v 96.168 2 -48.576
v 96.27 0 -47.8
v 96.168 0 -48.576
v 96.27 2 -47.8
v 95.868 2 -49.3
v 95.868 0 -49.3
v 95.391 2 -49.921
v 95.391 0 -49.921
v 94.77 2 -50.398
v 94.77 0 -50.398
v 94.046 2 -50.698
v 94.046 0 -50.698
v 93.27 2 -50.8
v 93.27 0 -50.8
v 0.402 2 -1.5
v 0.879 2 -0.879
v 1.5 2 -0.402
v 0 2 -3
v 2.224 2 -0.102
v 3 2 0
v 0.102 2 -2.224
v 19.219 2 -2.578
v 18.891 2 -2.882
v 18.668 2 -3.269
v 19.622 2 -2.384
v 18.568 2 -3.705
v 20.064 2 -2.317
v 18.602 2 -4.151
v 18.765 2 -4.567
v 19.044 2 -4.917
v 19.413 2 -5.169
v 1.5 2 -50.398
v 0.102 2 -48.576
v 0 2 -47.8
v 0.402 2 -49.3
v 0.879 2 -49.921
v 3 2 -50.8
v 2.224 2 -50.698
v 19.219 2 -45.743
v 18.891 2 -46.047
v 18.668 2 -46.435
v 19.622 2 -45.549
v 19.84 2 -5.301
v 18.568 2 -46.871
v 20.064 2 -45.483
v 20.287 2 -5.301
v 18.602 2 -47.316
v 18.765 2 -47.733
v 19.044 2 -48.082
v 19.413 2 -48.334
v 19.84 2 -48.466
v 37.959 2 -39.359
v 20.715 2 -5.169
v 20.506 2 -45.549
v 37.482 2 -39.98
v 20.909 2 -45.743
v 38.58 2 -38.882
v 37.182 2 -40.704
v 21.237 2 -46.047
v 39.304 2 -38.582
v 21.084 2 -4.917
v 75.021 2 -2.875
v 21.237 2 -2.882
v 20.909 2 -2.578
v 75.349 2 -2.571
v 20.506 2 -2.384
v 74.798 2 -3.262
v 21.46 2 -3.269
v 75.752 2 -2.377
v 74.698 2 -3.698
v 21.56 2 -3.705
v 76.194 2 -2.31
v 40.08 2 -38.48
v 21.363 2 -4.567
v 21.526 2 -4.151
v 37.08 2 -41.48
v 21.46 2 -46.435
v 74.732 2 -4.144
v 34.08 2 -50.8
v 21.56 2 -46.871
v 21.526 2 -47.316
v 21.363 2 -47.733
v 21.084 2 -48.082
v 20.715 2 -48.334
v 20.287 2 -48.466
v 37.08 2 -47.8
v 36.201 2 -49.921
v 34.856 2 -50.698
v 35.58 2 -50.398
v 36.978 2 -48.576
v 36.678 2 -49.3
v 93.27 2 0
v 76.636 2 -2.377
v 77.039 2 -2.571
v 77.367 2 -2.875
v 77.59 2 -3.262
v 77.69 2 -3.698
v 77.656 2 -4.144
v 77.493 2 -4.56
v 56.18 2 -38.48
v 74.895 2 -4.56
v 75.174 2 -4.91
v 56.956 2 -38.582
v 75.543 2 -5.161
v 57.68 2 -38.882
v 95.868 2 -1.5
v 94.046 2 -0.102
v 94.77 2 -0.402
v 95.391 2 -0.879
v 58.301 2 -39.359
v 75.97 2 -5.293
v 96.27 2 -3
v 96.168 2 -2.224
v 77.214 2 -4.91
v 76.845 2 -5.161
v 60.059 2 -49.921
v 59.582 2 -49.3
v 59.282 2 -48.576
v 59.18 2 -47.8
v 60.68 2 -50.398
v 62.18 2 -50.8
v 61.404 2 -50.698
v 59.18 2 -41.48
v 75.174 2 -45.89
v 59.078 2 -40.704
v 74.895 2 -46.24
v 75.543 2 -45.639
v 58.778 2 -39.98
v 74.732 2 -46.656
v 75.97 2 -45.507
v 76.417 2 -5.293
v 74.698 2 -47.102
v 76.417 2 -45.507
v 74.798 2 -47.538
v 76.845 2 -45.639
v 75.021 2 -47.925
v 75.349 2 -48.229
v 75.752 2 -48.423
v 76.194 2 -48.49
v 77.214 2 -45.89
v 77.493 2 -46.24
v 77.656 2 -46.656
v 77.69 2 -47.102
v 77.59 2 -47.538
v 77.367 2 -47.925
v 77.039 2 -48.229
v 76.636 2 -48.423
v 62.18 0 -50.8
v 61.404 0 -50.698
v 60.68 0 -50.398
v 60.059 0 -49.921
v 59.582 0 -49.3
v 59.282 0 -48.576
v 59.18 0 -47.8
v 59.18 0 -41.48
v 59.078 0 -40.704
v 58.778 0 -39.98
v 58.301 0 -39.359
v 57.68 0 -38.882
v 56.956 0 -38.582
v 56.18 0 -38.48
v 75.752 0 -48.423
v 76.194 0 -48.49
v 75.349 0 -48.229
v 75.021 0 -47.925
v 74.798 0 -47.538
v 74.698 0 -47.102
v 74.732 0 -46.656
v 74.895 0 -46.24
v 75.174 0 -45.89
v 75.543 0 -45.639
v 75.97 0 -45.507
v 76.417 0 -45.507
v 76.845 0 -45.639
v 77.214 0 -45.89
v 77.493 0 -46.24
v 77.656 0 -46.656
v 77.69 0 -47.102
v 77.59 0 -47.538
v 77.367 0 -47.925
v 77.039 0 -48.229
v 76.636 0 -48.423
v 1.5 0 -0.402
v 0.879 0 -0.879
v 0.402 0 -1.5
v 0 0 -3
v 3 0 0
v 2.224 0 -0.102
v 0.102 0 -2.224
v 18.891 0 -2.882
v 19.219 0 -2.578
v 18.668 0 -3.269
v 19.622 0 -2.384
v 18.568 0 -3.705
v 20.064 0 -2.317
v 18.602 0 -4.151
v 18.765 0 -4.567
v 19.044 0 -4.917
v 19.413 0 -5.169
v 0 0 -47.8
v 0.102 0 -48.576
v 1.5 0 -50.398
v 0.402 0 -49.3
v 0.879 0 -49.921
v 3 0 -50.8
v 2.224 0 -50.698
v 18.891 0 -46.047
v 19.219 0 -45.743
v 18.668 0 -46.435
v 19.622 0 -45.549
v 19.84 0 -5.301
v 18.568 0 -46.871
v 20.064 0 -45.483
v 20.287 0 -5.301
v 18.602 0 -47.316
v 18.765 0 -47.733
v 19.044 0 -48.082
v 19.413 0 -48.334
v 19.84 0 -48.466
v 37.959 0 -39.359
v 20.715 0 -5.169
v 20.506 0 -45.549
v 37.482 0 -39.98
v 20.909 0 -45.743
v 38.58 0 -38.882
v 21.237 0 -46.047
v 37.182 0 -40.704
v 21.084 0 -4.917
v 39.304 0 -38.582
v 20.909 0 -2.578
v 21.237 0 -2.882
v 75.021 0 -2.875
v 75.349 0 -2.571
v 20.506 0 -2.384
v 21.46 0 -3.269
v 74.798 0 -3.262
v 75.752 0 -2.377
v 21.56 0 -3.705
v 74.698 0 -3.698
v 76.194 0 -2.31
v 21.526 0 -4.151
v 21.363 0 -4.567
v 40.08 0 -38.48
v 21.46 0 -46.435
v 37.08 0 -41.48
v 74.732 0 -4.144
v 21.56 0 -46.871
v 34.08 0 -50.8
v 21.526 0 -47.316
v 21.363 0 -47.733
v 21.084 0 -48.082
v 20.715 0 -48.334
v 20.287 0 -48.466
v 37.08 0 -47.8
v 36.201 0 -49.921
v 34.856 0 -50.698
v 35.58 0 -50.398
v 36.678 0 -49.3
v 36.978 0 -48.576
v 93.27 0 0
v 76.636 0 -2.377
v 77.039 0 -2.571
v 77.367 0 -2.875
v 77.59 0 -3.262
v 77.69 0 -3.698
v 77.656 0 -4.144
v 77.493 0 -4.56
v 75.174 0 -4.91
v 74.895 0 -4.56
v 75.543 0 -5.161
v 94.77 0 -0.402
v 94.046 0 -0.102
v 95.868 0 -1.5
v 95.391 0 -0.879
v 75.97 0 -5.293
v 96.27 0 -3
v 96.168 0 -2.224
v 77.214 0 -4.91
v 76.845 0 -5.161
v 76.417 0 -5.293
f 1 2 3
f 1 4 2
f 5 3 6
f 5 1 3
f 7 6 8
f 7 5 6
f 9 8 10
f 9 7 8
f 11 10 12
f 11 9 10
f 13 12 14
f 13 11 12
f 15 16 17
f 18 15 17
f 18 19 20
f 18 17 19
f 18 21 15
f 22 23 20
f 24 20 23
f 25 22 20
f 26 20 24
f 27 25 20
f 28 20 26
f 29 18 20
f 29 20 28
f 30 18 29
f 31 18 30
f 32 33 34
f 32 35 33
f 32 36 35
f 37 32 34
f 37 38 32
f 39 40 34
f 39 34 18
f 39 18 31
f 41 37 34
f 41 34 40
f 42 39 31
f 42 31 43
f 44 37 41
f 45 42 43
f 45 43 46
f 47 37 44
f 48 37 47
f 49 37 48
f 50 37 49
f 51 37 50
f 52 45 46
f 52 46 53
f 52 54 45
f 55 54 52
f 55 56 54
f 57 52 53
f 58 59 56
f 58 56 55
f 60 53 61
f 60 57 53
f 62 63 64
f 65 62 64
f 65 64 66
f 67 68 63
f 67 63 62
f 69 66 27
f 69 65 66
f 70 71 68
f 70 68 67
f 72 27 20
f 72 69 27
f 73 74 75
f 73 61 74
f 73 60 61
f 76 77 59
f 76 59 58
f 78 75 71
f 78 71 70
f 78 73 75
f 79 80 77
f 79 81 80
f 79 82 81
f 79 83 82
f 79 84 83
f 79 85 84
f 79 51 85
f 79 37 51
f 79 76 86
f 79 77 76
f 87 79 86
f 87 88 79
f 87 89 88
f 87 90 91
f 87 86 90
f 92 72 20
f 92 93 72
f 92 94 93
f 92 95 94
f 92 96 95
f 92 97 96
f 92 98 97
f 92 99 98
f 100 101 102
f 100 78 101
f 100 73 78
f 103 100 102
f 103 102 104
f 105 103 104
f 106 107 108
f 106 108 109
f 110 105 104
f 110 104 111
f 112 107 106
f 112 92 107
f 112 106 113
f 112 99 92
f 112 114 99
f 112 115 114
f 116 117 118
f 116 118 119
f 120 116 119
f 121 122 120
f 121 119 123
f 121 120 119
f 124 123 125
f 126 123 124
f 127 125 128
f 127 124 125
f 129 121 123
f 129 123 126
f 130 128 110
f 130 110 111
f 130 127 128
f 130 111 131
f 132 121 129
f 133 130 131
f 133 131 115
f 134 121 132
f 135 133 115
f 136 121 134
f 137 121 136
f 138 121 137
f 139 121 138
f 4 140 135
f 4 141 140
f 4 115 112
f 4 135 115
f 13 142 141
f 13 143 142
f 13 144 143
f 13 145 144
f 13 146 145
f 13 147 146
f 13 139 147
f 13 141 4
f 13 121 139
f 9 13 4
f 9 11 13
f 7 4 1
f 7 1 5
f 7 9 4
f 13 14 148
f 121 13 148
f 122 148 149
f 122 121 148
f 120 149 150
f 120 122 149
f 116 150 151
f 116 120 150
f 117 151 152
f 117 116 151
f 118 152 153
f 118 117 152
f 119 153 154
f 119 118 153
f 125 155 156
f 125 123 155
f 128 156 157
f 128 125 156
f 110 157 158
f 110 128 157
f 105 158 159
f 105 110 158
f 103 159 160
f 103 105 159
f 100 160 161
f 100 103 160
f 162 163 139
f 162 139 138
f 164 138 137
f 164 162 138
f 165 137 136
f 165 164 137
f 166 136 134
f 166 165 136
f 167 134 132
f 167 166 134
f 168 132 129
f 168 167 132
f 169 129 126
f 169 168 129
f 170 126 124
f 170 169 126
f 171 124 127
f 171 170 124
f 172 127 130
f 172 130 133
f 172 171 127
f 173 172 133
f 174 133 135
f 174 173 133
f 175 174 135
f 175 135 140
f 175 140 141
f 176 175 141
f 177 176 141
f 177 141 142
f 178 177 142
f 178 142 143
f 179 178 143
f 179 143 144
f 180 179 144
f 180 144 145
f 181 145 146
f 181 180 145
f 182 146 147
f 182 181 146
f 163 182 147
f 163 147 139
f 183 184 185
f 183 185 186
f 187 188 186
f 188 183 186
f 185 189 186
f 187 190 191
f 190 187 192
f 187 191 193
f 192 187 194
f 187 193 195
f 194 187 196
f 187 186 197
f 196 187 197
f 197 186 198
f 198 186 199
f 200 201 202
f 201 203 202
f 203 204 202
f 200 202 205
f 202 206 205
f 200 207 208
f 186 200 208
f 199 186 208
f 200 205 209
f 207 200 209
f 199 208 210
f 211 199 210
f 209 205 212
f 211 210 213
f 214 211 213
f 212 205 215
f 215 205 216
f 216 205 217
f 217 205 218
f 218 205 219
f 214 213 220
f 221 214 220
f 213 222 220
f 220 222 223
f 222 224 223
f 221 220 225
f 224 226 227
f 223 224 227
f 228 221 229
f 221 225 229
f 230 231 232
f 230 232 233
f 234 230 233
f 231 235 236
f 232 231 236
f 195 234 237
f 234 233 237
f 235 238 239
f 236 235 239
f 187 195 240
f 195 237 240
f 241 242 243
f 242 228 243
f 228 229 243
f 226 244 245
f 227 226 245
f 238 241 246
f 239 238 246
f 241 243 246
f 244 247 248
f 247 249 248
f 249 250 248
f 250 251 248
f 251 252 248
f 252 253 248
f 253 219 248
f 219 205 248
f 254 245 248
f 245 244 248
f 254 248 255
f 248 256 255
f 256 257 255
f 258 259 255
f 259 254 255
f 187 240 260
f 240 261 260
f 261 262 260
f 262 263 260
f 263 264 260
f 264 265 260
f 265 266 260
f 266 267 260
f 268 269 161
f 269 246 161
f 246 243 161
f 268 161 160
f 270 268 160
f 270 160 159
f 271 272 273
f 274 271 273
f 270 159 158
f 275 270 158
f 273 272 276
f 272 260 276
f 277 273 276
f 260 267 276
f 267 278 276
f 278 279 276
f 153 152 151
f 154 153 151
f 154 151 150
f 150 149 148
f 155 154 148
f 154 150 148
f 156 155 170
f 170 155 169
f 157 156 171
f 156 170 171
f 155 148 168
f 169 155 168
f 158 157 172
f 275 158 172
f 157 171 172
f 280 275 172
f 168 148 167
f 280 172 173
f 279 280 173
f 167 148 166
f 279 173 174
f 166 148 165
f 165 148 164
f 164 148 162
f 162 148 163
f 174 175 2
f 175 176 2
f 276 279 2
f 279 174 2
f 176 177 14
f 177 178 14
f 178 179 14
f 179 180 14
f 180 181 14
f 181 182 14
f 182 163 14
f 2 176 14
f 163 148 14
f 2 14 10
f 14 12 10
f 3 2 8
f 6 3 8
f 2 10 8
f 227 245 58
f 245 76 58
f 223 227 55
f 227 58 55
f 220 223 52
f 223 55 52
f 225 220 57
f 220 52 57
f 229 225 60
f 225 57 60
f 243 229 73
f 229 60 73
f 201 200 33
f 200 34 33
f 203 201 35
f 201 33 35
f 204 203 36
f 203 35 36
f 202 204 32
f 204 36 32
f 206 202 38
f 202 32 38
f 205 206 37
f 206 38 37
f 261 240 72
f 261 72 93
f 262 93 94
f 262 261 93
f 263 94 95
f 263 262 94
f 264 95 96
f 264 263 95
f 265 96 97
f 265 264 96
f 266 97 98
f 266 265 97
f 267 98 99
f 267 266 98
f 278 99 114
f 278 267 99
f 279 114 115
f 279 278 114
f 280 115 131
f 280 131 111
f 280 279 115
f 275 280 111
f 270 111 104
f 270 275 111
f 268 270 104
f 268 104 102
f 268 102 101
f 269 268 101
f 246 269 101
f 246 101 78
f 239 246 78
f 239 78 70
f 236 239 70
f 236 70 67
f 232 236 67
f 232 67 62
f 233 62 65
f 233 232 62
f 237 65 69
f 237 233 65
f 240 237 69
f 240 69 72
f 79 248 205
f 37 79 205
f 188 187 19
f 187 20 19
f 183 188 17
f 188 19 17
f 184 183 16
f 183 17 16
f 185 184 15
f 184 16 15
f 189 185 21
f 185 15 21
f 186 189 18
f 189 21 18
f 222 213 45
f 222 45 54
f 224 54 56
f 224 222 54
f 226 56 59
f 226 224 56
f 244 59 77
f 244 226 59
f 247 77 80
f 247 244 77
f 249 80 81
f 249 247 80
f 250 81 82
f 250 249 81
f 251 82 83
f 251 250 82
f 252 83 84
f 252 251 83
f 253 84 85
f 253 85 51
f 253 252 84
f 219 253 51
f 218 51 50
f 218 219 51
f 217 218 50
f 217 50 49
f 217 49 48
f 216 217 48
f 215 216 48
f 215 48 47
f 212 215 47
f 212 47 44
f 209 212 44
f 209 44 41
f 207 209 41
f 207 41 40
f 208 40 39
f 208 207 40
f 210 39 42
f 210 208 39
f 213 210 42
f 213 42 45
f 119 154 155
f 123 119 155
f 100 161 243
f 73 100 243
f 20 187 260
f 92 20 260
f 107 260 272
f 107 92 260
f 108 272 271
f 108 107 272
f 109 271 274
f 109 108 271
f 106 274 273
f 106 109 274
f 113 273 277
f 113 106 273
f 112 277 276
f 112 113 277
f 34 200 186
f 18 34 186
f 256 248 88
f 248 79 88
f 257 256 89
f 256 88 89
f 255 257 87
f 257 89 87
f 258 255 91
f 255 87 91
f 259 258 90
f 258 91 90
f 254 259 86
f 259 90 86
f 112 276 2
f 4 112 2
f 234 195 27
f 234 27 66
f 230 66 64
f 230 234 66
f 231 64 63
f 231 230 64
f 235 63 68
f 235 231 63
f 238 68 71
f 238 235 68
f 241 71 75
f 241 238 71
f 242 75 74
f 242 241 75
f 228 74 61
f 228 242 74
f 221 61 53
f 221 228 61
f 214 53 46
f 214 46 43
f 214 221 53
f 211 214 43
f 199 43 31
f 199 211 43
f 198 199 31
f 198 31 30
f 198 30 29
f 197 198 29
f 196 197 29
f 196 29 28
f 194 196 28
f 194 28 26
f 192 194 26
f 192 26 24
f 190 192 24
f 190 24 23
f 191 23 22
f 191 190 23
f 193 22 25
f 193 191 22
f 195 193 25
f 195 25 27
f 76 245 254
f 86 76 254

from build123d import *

# Parameters (mm, degrees)
SKETCH_1_R      = 1.5
EXTRUDE_1_DEPTH = 2
FILLET_1_R      = 3


with BuildPart() as part:
    # 草图1 → 凸台-拉伸1 (new body)
    with BuildSketch(Plane(origin=(0, 0, 0), x_dir=(1, 0, 0), z_dir=(0, 1, 0))):
        Polygon((0, 0), (96.27, 0), (96.27, 50.8), (59.18, 50.8), (59.18, 38.48), (37.08, 38.48), (37.08, 50.8), (0, 50.8), align=None)
        with Locations(Location((20.063894942, 46.982706601, 0), (0, 0, 270))):
            Circle(SKETCH_1_R, mode=Mode.SUBTRACT)
        with Locations(Location((76.193894468, 46.99, 0), (0, 0, 90))):
            Circle(SKETCH_1_R, mode=Mode.SUBTRACT)
        with Locations(Location((76.193894468, 3.81, 0), (0, 0, 270))):
            Circle(SKETCH_1_R, mode=Mode.SUBTRACT)
        with Locations(Location((20.063894942, 3.817293399, 0), (0, 0, 270))):
            Circle(SKETCH_1_R, mode=Mode.SUBTRACT)
    extrude(amount=EXTRUDE_1_DEPTH)

    # 圆角1
    fillet_1_edges = [part.edges().sort_by_distance(p)[0] for p in [
        (37.08, 1, -50.8),
        (37.08, 1, -38.48),
        (59.18, 1, -38.48),
        (59.18, 1, -50.8),
        (96.27, 1, -50.8),
        (96.27, 1, 0),
        (0, 1, 0),
        (0, 1, -50.8),
    ]]
    fillet(fillet_1_edges, radius=FILLET_1_R)


solid = part.part
